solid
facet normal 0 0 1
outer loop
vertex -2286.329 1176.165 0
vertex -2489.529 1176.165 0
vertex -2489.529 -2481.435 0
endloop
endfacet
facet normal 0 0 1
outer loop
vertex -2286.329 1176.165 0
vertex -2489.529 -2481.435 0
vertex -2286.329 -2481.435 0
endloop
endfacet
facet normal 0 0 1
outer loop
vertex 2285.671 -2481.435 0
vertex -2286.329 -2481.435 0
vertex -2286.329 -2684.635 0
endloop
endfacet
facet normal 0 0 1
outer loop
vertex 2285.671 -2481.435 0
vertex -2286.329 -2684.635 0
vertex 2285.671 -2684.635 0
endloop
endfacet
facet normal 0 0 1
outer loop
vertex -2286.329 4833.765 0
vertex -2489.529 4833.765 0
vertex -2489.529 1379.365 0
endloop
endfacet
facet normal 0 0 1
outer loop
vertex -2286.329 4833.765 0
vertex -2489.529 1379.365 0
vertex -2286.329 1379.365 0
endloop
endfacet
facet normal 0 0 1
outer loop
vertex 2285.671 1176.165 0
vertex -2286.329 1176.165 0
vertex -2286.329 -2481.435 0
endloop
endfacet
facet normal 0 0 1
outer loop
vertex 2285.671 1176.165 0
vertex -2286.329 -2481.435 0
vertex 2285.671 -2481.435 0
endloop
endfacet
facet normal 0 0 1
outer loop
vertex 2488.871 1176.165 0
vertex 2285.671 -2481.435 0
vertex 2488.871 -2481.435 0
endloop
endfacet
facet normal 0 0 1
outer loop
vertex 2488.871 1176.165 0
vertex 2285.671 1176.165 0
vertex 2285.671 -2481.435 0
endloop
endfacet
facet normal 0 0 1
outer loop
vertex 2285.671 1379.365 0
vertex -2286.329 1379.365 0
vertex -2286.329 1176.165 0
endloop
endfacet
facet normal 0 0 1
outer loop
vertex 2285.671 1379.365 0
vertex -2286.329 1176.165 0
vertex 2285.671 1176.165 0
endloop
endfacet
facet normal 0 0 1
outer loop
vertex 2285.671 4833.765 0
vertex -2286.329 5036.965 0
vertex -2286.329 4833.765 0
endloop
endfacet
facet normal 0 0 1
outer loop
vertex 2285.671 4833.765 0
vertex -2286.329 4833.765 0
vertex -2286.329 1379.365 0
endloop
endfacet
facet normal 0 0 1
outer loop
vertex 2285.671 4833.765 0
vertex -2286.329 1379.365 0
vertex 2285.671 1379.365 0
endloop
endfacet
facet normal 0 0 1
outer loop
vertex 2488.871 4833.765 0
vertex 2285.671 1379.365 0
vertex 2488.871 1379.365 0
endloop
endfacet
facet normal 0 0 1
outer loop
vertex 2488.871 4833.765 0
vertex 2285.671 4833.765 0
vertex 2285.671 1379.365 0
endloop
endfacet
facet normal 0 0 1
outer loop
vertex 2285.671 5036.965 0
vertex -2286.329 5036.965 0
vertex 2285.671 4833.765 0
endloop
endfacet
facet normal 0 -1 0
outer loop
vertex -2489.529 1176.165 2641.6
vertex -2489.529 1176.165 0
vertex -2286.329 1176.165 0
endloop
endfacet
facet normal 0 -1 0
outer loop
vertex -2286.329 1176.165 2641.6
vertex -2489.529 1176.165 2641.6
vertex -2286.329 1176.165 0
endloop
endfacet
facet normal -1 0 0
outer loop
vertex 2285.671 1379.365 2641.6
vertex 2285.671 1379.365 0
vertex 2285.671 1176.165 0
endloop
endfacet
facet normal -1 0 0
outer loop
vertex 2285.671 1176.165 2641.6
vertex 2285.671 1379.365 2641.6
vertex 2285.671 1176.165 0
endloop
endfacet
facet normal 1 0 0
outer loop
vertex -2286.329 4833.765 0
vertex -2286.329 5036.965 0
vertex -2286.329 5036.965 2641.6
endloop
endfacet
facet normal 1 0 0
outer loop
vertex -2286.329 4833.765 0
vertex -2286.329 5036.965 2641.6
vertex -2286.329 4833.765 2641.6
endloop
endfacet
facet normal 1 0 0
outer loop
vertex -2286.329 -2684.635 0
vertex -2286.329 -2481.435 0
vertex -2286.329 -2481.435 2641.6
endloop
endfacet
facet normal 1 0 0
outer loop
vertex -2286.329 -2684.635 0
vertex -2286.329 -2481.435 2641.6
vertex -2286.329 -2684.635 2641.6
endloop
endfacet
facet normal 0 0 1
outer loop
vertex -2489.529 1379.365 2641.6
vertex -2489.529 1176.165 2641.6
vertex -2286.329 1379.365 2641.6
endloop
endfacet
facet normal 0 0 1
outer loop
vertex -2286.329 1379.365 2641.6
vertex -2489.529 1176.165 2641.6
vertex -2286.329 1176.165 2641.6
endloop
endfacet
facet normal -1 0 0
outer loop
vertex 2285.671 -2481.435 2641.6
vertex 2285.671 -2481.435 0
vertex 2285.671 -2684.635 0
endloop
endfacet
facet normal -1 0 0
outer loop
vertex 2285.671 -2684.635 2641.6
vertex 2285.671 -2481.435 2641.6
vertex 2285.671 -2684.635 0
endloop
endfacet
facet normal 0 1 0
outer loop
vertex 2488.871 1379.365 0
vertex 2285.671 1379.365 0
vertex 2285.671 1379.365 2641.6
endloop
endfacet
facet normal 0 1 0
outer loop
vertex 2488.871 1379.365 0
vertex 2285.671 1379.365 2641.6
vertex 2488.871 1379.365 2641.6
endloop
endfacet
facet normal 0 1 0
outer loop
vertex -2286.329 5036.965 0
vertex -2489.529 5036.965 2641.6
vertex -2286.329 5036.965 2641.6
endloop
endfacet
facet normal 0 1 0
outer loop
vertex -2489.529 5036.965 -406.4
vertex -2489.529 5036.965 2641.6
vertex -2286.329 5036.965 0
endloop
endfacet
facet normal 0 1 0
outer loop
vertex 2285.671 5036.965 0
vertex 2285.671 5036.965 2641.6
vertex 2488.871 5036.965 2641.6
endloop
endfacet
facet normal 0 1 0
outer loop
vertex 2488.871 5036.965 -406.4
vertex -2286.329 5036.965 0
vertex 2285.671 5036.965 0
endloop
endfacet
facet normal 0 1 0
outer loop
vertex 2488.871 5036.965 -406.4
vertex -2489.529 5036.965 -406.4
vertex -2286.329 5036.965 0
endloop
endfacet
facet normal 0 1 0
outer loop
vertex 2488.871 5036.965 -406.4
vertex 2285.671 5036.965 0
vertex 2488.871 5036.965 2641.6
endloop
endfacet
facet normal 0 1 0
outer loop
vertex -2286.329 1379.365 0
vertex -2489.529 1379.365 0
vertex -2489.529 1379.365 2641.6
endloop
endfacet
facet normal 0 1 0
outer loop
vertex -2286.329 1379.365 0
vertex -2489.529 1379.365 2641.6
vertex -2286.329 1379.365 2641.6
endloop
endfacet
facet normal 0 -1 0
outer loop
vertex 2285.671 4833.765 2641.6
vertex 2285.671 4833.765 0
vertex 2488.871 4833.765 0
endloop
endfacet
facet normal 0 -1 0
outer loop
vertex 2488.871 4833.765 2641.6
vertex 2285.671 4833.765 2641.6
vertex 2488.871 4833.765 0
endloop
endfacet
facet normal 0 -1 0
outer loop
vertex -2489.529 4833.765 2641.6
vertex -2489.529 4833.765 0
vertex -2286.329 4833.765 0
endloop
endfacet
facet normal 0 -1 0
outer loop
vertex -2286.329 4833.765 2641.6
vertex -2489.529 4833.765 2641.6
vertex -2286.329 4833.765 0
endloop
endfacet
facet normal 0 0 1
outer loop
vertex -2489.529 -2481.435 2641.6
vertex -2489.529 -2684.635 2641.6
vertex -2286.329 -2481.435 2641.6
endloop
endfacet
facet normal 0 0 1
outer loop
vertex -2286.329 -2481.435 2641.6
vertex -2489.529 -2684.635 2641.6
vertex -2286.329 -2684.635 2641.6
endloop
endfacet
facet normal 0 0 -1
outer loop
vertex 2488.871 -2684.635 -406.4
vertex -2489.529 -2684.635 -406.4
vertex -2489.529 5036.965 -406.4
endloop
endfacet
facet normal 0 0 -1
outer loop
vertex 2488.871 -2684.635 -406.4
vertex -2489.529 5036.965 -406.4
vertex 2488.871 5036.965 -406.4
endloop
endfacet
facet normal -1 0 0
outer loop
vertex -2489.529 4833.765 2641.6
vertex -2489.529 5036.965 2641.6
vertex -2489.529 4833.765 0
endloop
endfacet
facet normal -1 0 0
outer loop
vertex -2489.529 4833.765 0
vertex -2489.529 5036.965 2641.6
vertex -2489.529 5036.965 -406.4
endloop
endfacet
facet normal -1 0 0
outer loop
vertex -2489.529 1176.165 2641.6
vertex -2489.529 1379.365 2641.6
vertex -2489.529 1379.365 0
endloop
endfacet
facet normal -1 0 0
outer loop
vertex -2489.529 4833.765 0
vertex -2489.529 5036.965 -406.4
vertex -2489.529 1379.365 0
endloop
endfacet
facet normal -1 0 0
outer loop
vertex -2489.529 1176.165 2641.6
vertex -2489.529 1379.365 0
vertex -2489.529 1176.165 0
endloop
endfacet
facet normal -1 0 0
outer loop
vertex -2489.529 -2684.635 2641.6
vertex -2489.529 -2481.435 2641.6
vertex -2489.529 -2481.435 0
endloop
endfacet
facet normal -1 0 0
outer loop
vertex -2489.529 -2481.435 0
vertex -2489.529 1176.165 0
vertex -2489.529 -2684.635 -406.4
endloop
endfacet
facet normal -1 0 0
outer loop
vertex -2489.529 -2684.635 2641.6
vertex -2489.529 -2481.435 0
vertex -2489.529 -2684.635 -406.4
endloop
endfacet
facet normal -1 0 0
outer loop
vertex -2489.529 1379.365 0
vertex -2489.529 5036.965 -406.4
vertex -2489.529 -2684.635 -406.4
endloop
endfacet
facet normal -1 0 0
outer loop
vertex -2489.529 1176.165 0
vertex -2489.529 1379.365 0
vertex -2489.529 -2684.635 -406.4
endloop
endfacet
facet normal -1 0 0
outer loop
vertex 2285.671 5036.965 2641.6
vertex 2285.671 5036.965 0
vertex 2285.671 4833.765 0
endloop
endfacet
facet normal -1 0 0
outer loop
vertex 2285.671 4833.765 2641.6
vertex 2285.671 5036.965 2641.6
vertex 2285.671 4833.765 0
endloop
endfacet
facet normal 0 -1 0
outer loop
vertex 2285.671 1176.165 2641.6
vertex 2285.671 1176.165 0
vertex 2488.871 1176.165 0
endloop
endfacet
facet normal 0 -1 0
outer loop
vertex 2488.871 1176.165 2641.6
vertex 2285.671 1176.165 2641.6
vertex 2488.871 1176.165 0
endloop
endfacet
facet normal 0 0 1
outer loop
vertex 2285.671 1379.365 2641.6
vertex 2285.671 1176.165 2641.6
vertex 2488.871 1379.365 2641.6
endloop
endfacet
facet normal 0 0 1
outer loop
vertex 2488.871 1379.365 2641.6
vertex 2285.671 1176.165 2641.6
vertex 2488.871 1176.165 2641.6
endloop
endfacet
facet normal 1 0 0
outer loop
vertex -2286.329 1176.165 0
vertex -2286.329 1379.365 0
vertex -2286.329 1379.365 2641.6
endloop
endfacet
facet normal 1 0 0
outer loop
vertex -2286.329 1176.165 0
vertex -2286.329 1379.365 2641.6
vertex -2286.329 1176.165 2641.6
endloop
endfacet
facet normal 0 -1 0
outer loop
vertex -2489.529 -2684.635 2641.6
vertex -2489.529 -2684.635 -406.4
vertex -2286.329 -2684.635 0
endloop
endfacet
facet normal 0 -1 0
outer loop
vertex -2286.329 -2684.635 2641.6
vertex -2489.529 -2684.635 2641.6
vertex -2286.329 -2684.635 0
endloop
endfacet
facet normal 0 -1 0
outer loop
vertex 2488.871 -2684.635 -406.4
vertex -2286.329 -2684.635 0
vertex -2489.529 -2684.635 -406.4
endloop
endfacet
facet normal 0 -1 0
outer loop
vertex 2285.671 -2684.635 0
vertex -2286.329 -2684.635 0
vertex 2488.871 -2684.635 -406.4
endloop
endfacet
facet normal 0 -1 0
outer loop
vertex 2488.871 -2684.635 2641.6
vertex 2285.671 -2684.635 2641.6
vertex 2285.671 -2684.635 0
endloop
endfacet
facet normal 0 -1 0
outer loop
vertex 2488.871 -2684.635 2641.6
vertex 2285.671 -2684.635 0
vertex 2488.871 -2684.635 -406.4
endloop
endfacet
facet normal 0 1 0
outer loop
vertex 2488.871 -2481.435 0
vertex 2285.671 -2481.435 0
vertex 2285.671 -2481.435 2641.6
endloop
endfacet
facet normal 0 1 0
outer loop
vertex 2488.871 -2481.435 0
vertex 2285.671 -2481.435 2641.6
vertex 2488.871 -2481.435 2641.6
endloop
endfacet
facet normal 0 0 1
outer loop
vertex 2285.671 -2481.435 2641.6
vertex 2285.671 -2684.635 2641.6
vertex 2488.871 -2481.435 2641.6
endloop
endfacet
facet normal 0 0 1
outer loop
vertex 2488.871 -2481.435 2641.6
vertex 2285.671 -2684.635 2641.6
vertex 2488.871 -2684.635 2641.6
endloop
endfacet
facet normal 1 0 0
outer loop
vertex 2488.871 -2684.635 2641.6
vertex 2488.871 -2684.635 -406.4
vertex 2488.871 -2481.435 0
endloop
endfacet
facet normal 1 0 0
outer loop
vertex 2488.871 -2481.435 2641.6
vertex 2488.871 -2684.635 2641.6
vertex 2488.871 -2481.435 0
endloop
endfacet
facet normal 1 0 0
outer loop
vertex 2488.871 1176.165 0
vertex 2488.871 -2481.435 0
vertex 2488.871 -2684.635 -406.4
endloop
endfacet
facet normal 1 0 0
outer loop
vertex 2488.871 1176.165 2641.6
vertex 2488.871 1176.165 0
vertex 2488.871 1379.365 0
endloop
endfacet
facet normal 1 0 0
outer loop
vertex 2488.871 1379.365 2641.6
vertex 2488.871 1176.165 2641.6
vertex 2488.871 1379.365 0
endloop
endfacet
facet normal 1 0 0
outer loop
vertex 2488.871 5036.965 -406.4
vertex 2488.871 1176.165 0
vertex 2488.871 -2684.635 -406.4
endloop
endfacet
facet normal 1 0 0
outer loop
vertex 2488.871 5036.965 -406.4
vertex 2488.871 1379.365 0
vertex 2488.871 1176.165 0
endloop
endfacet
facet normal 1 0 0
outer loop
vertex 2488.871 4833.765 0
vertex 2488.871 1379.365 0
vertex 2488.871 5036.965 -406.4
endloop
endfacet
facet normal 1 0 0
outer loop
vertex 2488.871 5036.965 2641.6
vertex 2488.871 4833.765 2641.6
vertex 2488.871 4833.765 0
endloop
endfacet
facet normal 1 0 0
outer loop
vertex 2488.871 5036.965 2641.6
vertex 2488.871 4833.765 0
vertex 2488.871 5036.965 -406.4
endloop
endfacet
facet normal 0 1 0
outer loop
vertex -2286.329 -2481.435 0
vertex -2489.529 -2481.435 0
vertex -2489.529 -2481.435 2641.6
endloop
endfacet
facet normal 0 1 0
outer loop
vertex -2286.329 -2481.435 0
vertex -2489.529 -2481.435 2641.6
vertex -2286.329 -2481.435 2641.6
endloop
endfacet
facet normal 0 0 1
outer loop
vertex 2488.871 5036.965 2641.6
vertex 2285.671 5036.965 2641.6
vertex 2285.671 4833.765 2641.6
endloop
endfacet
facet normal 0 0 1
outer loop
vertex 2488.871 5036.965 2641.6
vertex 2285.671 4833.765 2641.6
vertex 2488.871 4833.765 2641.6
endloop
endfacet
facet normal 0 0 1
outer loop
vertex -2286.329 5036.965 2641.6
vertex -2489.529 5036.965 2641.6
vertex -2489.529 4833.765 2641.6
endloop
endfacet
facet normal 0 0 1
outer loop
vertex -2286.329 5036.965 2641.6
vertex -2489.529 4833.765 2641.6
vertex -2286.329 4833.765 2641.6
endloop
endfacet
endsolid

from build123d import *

# Parameters (mm, degrees)
F0_W      = 4978.4
F0_H      = 7721.6
F1_DEPTH  = 406.4
F3_W      = 203.2
F3_H      = 203.2
F4_DEPTH  = 3048
F5_W      = 203.2
F5_H      = 203.2
F6_DEPTH  = 3048
F8_W      = 203.2
F8_H      = 203.2
F9_DEPTH  = 3048
F10_W     = 203.2
F10_H     = 203.2
F11_DEPTH = 3048
F12_W     = 203.2
F12_H     = 203.2
F13_DEPTH = 3048
F14_W     = 203.2
F14_H     = 203.2
F15_DEPTH = 3048
F17_W     = 203.2
F17_H     = 3454.4
F18_DEPTH = 203.2


with BuildPart() as f1:
    # F0 (on Top) → F1 (new body)
    with BuildSketch(Plane.XY):
        with Locations((-0.3292579204, 1176.1648918583)):
            Rectangle(F0_W, F0_H)
    extrude(amount=-F1_DEPTH)

    # F3 (on face) → F4 (join)
    with BuildSketch(Plane(origin=(0, 0, -406.4), x_dir=(1, 0, 0), z_dir=(0, 0, -1))):
        with Locations((-2387.9292579204, 2583.0351081417)):
            Rectangle(F3_W, F3_H)
    extrude(amount=-F4_DEPTH)

    # F5 (on face) → F6 (join)
    with BuildSketch(Plane(origin=(0, 0, -406.4), x_dir=(1, 0, 0), z_dir=(0, 0, -1))):
        with Locations((2387.2707420796, 2583.0351081417)):
            Rectangle(F5_W, F5_H)
    extrude(amount=-F6_DEPTH)

    # F8 (on face) → F9 (join)
    with BuildSketch(Plane(origin=(0, 0, -406.4), x_dir=(1, 0, 0), z_dir=(0, 0, -1))):
        with Locations((2387.2707420796, -4935.3648918583)):
            Rectangle(F8_W, F8_H)
    extrude(amount=-F9_DEPTH)

    # F10 (on face) → F11 (join)
    with BuildSketch(Plane(origin=(0, 0, -406.4), x_dir=(1, 0, 0), z_dir=(0, 0, -1))):
        with Locations((-2387.9292579204, -4935.3648918583)):
            Rectangle(F10_W, F10_H)
    extrude(amount=-F11_DEPTH)

    # F12 (on face) → F13 (join)
    with BuildSketch(Plane(origin=(0, 0, -406.4), x_dir=(1, 0, 0), z_dir=(0, 0, -1))):
        with Locations((-2387.9292579204, -1277.7648918583)):
            Rectangle(F12_W, F12_H)
    extrude(amount=-F13_DEPTH)

    # F14 (on face) → F15 (join)
    with BuildSketch(Plane(origin=(0, 0, -406.4), x_dir=(1, 0, 0), z_dir=(0, 0, -1))):
        with Locations((2387.2707420796, -1277.7648918583)):
            Rectangle(F14_W, F14_H)
    extrude(amount=-F15_DEPTH)

    # F17 (on face) → F18 (join)
    with BuildSketch(Plane.XY):
        with Locations((2387.2707420796, 3106.5648918583)):
            Rectangle(F17_W, F17_H)
    extrude(amount=-F18_DEPTH)


solid = f1.part
